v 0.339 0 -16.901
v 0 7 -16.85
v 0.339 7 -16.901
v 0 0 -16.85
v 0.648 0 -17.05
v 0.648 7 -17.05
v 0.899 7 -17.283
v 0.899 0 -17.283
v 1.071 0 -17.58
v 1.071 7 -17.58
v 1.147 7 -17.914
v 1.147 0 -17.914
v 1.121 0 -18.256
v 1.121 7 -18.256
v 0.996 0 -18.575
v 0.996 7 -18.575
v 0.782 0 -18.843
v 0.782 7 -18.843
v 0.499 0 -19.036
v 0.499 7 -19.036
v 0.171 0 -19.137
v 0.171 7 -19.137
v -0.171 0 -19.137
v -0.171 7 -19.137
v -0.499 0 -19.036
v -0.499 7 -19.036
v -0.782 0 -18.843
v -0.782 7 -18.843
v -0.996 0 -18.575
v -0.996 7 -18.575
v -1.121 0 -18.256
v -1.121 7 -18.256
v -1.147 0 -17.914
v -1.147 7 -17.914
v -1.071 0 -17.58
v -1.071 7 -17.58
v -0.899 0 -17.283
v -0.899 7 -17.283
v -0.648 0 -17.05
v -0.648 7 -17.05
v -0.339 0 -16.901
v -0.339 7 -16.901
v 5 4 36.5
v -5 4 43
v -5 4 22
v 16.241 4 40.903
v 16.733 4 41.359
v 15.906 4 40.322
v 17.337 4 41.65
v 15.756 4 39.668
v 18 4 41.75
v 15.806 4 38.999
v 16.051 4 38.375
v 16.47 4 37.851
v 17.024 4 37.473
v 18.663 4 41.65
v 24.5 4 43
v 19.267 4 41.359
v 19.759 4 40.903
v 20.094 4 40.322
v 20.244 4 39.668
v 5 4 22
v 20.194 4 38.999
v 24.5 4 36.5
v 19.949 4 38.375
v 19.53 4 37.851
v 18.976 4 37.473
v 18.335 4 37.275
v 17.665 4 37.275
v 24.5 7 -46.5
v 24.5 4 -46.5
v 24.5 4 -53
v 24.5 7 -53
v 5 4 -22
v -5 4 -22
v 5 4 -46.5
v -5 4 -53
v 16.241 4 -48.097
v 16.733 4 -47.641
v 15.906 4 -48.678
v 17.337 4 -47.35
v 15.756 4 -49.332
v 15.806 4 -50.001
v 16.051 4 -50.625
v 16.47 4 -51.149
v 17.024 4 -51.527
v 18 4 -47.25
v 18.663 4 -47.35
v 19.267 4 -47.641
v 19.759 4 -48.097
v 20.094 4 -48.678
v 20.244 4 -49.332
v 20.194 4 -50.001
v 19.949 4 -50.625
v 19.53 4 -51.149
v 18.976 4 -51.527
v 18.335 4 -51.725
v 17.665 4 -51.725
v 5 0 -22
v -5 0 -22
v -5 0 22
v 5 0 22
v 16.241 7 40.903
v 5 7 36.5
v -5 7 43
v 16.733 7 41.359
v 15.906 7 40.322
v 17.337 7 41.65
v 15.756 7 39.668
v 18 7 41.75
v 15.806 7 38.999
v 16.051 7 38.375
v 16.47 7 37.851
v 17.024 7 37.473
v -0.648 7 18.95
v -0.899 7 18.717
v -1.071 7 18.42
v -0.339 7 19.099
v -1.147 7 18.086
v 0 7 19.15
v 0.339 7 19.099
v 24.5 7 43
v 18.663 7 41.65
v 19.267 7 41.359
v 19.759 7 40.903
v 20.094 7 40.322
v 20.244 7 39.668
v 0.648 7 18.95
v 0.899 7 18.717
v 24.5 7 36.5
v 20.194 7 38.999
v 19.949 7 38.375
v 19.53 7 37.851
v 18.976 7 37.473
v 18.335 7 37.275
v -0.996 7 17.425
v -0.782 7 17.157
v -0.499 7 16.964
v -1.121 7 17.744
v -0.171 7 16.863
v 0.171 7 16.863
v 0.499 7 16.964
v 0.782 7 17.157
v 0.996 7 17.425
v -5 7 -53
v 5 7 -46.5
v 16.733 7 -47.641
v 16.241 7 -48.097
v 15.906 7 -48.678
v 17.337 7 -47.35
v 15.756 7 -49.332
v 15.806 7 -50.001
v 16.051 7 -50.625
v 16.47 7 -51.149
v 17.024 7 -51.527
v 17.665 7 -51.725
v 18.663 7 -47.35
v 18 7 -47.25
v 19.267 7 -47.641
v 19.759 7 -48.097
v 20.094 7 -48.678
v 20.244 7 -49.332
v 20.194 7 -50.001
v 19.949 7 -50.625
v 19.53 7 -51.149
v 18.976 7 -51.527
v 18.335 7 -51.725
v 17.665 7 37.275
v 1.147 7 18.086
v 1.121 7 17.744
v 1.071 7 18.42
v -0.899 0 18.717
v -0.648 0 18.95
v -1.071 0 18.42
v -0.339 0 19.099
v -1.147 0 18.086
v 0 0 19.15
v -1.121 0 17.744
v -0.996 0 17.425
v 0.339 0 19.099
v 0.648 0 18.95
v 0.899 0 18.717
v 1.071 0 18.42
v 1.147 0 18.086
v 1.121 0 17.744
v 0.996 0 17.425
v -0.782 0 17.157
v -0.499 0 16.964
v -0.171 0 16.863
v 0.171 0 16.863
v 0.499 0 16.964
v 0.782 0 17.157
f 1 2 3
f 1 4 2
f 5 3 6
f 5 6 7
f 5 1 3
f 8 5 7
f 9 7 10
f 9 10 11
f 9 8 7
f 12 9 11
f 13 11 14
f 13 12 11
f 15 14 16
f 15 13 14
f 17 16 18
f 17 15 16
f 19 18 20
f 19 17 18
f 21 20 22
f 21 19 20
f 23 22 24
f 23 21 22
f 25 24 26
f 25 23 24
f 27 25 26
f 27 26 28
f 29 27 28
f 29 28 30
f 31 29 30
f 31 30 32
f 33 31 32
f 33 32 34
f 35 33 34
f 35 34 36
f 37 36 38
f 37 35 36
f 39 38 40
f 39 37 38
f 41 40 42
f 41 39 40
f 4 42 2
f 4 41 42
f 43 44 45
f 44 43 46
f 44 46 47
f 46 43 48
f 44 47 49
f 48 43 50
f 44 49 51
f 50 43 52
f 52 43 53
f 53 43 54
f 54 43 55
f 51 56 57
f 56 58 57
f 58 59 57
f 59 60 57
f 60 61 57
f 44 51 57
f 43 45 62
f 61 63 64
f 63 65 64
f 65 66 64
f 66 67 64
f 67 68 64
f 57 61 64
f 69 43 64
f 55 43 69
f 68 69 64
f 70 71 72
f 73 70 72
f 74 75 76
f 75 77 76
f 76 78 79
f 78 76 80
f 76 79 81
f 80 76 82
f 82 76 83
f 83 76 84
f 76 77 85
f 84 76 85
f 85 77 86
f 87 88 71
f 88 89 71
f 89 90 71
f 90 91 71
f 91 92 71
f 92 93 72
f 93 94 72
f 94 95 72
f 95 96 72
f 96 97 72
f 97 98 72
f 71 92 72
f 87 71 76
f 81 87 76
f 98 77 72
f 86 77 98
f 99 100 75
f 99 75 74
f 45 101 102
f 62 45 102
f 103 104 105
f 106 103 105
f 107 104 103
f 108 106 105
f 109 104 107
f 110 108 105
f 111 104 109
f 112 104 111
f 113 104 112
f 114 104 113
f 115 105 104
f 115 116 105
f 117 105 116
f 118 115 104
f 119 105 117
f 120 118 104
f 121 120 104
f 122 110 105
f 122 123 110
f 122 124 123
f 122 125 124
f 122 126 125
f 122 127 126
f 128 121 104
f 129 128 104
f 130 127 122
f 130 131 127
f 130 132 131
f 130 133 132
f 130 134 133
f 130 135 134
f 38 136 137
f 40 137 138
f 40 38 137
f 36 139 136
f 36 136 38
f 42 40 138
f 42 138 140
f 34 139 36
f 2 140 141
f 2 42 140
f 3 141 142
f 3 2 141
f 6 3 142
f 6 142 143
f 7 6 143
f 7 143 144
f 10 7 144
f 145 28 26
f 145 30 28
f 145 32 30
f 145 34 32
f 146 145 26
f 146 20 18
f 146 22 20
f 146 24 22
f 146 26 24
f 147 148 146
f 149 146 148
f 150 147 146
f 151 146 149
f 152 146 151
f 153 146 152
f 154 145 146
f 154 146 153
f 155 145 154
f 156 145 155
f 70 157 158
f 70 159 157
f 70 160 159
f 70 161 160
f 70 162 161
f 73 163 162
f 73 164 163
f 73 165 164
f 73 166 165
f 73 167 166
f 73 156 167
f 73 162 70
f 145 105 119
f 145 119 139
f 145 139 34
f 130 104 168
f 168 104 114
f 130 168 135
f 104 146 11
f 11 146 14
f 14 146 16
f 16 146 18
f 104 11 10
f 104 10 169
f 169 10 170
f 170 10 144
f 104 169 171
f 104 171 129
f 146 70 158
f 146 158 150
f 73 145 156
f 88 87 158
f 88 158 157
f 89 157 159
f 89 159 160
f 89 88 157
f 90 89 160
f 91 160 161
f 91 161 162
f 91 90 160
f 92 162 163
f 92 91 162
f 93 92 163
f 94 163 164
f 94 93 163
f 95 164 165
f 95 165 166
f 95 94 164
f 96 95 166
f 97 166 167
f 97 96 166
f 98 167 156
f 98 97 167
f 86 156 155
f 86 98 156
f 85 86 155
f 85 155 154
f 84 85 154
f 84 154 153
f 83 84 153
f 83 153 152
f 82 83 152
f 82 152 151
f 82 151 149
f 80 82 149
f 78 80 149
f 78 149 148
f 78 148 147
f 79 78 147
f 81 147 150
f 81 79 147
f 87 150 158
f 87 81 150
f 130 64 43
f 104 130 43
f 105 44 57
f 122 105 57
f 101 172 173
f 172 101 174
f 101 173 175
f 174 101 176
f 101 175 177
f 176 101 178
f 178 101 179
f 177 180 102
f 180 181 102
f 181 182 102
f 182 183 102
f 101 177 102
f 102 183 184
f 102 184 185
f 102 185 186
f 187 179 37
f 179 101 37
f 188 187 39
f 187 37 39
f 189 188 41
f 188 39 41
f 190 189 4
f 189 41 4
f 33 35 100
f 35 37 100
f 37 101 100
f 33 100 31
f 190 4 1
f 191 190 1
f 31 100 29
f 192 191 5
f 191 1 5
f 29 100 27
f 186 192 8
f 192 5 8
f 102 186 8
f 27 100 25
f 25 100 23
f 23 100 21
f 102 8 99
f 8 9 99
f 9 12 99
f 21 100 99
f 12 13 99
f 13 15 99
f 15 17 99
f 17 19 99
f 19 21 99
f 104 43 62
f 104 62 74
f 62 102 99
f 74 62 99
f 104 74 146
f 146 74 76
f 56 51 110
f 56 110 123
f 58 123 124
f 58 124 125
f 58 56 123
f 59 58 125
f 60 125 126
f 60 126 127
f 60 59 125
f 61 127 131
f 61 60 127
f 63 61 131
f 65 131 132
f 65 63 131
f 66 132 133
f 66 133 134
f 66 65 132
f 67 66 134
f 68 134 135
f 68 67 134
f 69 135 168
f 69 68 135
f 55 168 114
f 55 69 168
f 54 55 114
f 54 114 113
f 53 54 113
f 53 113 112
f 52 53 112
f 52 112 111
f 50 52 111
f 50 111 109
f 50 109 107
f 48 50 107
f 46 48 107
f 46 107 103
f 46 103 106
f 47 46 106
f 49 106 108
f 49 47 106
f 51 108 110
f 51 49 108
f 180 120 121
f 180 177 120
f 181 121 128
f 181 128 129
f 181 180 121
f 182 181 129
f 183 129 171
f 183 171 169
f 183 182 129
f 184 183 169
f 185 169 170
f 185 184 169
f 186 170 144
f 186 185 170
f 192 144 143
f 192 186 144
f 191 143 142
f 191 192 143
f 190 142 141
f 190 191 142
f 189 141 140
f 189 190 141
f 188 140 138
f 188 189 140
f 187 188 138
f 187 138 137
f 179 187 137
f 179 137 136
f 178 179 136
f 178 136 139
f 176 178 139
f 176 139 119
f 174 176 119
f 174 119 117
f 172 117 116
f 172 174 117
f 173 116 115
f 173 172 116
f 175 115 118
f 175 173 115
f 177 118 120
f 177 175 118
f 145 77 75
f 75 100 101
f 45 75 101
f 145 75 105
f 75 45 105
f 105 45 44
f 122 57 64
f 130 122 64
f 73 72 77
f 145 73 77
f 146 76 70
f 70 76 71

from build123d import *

# Parameters (mm, degrees)
SKETCH_1_W      = 10
SKETCH_1_H      = 44
SKETCH_1_R      = 1.15
EXTRUDE_1_DEPTH = 4
SKETCH_2_R      = 2.25
SKETCH_2_R_2    = 1.15
EXTRUDE_2_DEPTH = 3


with BuildPart() as part:
    # 草图1 → 凸台-拉伸1 (new body)
    with BuildSketch(Plane(origin=(0, 0, 0), x_dir=(1, 0, 0), z_dir=(0, 1, 0))):
        Rectangle(SKETCH_1_W, SKETCH_1_H)
        with Locations(Location((0, -18, 0), (0, 0, 270))):
            Circle(SKETCH_1_R, mode=Mode.SUBTRACT)
        with Locations(Location((0, 18, 0), (0, 0, 270))):
            Circle(SKETCH_1_R, mode=Mode.SUBTRACT)
    extrude(amount=EXTRUDE_1_DEPTH)

    # 草图2 → 凸台-拉伸2 (add)
    # profile 1 of 3: a face of its own
    with BuildSketch(Plane(origin=(0, 4, 0), x_dir=(1, 0, 0), z_dir=(0, 1, 0))):
        Polygon((-5, 32), (-5, 22), (5, 22), (5, 32), (5, 46.5), (24.5, 46.5), (24.5, 53), (-5, 53), (-5, 45.896329407), align=None)
        with Locations(Location((18, 49.5, 0), (0, 0, 270))):
            Circle(SKETCH_2_R, mode=Mode.SUBTRACT)
    # profile 2 of 3: a face of its own
    with BuildSketch(Plane(origin=(0, 4, 0), x_dir=(1, 0, 0), z_dir=(0, 1, 0))):
        Polygon((-5, -12), (-5, -22), (5, -22), (5, -12), (5, 22), (-5, 22), align=None)
        with Locations(Location((0, -18, 0), (0, 0, 270))):
            Circle(SKETCH_2_R_2, mode=Mode.SUBTRACT)
        with Locations(Location((0, 18, 0), (0, 0, 270))):
            Circle(SKETCH_2_R_2, mode=Mode.SUBTRACT)
    # profile 3 of 3: a face of its own
    with BuildSketch(Plane(origin=(0, 4, 0), x_dir=(1, 0, 0), z_dir=(0, 1, 0))):
        Polygon((24.5, -36.5), (5, -36.5), (5, -22), (-5, -22), (-5, -43), (24.5, -43), align=None)
        with Locations(Location((18, -39.5, 0), (0, 0, 270))):
            Circle(SKETCH_2_R, mode=Mode.SUBTRACT)
    extrude(amount=EXTRUDE_2_DEPTH)


solid = part.part
